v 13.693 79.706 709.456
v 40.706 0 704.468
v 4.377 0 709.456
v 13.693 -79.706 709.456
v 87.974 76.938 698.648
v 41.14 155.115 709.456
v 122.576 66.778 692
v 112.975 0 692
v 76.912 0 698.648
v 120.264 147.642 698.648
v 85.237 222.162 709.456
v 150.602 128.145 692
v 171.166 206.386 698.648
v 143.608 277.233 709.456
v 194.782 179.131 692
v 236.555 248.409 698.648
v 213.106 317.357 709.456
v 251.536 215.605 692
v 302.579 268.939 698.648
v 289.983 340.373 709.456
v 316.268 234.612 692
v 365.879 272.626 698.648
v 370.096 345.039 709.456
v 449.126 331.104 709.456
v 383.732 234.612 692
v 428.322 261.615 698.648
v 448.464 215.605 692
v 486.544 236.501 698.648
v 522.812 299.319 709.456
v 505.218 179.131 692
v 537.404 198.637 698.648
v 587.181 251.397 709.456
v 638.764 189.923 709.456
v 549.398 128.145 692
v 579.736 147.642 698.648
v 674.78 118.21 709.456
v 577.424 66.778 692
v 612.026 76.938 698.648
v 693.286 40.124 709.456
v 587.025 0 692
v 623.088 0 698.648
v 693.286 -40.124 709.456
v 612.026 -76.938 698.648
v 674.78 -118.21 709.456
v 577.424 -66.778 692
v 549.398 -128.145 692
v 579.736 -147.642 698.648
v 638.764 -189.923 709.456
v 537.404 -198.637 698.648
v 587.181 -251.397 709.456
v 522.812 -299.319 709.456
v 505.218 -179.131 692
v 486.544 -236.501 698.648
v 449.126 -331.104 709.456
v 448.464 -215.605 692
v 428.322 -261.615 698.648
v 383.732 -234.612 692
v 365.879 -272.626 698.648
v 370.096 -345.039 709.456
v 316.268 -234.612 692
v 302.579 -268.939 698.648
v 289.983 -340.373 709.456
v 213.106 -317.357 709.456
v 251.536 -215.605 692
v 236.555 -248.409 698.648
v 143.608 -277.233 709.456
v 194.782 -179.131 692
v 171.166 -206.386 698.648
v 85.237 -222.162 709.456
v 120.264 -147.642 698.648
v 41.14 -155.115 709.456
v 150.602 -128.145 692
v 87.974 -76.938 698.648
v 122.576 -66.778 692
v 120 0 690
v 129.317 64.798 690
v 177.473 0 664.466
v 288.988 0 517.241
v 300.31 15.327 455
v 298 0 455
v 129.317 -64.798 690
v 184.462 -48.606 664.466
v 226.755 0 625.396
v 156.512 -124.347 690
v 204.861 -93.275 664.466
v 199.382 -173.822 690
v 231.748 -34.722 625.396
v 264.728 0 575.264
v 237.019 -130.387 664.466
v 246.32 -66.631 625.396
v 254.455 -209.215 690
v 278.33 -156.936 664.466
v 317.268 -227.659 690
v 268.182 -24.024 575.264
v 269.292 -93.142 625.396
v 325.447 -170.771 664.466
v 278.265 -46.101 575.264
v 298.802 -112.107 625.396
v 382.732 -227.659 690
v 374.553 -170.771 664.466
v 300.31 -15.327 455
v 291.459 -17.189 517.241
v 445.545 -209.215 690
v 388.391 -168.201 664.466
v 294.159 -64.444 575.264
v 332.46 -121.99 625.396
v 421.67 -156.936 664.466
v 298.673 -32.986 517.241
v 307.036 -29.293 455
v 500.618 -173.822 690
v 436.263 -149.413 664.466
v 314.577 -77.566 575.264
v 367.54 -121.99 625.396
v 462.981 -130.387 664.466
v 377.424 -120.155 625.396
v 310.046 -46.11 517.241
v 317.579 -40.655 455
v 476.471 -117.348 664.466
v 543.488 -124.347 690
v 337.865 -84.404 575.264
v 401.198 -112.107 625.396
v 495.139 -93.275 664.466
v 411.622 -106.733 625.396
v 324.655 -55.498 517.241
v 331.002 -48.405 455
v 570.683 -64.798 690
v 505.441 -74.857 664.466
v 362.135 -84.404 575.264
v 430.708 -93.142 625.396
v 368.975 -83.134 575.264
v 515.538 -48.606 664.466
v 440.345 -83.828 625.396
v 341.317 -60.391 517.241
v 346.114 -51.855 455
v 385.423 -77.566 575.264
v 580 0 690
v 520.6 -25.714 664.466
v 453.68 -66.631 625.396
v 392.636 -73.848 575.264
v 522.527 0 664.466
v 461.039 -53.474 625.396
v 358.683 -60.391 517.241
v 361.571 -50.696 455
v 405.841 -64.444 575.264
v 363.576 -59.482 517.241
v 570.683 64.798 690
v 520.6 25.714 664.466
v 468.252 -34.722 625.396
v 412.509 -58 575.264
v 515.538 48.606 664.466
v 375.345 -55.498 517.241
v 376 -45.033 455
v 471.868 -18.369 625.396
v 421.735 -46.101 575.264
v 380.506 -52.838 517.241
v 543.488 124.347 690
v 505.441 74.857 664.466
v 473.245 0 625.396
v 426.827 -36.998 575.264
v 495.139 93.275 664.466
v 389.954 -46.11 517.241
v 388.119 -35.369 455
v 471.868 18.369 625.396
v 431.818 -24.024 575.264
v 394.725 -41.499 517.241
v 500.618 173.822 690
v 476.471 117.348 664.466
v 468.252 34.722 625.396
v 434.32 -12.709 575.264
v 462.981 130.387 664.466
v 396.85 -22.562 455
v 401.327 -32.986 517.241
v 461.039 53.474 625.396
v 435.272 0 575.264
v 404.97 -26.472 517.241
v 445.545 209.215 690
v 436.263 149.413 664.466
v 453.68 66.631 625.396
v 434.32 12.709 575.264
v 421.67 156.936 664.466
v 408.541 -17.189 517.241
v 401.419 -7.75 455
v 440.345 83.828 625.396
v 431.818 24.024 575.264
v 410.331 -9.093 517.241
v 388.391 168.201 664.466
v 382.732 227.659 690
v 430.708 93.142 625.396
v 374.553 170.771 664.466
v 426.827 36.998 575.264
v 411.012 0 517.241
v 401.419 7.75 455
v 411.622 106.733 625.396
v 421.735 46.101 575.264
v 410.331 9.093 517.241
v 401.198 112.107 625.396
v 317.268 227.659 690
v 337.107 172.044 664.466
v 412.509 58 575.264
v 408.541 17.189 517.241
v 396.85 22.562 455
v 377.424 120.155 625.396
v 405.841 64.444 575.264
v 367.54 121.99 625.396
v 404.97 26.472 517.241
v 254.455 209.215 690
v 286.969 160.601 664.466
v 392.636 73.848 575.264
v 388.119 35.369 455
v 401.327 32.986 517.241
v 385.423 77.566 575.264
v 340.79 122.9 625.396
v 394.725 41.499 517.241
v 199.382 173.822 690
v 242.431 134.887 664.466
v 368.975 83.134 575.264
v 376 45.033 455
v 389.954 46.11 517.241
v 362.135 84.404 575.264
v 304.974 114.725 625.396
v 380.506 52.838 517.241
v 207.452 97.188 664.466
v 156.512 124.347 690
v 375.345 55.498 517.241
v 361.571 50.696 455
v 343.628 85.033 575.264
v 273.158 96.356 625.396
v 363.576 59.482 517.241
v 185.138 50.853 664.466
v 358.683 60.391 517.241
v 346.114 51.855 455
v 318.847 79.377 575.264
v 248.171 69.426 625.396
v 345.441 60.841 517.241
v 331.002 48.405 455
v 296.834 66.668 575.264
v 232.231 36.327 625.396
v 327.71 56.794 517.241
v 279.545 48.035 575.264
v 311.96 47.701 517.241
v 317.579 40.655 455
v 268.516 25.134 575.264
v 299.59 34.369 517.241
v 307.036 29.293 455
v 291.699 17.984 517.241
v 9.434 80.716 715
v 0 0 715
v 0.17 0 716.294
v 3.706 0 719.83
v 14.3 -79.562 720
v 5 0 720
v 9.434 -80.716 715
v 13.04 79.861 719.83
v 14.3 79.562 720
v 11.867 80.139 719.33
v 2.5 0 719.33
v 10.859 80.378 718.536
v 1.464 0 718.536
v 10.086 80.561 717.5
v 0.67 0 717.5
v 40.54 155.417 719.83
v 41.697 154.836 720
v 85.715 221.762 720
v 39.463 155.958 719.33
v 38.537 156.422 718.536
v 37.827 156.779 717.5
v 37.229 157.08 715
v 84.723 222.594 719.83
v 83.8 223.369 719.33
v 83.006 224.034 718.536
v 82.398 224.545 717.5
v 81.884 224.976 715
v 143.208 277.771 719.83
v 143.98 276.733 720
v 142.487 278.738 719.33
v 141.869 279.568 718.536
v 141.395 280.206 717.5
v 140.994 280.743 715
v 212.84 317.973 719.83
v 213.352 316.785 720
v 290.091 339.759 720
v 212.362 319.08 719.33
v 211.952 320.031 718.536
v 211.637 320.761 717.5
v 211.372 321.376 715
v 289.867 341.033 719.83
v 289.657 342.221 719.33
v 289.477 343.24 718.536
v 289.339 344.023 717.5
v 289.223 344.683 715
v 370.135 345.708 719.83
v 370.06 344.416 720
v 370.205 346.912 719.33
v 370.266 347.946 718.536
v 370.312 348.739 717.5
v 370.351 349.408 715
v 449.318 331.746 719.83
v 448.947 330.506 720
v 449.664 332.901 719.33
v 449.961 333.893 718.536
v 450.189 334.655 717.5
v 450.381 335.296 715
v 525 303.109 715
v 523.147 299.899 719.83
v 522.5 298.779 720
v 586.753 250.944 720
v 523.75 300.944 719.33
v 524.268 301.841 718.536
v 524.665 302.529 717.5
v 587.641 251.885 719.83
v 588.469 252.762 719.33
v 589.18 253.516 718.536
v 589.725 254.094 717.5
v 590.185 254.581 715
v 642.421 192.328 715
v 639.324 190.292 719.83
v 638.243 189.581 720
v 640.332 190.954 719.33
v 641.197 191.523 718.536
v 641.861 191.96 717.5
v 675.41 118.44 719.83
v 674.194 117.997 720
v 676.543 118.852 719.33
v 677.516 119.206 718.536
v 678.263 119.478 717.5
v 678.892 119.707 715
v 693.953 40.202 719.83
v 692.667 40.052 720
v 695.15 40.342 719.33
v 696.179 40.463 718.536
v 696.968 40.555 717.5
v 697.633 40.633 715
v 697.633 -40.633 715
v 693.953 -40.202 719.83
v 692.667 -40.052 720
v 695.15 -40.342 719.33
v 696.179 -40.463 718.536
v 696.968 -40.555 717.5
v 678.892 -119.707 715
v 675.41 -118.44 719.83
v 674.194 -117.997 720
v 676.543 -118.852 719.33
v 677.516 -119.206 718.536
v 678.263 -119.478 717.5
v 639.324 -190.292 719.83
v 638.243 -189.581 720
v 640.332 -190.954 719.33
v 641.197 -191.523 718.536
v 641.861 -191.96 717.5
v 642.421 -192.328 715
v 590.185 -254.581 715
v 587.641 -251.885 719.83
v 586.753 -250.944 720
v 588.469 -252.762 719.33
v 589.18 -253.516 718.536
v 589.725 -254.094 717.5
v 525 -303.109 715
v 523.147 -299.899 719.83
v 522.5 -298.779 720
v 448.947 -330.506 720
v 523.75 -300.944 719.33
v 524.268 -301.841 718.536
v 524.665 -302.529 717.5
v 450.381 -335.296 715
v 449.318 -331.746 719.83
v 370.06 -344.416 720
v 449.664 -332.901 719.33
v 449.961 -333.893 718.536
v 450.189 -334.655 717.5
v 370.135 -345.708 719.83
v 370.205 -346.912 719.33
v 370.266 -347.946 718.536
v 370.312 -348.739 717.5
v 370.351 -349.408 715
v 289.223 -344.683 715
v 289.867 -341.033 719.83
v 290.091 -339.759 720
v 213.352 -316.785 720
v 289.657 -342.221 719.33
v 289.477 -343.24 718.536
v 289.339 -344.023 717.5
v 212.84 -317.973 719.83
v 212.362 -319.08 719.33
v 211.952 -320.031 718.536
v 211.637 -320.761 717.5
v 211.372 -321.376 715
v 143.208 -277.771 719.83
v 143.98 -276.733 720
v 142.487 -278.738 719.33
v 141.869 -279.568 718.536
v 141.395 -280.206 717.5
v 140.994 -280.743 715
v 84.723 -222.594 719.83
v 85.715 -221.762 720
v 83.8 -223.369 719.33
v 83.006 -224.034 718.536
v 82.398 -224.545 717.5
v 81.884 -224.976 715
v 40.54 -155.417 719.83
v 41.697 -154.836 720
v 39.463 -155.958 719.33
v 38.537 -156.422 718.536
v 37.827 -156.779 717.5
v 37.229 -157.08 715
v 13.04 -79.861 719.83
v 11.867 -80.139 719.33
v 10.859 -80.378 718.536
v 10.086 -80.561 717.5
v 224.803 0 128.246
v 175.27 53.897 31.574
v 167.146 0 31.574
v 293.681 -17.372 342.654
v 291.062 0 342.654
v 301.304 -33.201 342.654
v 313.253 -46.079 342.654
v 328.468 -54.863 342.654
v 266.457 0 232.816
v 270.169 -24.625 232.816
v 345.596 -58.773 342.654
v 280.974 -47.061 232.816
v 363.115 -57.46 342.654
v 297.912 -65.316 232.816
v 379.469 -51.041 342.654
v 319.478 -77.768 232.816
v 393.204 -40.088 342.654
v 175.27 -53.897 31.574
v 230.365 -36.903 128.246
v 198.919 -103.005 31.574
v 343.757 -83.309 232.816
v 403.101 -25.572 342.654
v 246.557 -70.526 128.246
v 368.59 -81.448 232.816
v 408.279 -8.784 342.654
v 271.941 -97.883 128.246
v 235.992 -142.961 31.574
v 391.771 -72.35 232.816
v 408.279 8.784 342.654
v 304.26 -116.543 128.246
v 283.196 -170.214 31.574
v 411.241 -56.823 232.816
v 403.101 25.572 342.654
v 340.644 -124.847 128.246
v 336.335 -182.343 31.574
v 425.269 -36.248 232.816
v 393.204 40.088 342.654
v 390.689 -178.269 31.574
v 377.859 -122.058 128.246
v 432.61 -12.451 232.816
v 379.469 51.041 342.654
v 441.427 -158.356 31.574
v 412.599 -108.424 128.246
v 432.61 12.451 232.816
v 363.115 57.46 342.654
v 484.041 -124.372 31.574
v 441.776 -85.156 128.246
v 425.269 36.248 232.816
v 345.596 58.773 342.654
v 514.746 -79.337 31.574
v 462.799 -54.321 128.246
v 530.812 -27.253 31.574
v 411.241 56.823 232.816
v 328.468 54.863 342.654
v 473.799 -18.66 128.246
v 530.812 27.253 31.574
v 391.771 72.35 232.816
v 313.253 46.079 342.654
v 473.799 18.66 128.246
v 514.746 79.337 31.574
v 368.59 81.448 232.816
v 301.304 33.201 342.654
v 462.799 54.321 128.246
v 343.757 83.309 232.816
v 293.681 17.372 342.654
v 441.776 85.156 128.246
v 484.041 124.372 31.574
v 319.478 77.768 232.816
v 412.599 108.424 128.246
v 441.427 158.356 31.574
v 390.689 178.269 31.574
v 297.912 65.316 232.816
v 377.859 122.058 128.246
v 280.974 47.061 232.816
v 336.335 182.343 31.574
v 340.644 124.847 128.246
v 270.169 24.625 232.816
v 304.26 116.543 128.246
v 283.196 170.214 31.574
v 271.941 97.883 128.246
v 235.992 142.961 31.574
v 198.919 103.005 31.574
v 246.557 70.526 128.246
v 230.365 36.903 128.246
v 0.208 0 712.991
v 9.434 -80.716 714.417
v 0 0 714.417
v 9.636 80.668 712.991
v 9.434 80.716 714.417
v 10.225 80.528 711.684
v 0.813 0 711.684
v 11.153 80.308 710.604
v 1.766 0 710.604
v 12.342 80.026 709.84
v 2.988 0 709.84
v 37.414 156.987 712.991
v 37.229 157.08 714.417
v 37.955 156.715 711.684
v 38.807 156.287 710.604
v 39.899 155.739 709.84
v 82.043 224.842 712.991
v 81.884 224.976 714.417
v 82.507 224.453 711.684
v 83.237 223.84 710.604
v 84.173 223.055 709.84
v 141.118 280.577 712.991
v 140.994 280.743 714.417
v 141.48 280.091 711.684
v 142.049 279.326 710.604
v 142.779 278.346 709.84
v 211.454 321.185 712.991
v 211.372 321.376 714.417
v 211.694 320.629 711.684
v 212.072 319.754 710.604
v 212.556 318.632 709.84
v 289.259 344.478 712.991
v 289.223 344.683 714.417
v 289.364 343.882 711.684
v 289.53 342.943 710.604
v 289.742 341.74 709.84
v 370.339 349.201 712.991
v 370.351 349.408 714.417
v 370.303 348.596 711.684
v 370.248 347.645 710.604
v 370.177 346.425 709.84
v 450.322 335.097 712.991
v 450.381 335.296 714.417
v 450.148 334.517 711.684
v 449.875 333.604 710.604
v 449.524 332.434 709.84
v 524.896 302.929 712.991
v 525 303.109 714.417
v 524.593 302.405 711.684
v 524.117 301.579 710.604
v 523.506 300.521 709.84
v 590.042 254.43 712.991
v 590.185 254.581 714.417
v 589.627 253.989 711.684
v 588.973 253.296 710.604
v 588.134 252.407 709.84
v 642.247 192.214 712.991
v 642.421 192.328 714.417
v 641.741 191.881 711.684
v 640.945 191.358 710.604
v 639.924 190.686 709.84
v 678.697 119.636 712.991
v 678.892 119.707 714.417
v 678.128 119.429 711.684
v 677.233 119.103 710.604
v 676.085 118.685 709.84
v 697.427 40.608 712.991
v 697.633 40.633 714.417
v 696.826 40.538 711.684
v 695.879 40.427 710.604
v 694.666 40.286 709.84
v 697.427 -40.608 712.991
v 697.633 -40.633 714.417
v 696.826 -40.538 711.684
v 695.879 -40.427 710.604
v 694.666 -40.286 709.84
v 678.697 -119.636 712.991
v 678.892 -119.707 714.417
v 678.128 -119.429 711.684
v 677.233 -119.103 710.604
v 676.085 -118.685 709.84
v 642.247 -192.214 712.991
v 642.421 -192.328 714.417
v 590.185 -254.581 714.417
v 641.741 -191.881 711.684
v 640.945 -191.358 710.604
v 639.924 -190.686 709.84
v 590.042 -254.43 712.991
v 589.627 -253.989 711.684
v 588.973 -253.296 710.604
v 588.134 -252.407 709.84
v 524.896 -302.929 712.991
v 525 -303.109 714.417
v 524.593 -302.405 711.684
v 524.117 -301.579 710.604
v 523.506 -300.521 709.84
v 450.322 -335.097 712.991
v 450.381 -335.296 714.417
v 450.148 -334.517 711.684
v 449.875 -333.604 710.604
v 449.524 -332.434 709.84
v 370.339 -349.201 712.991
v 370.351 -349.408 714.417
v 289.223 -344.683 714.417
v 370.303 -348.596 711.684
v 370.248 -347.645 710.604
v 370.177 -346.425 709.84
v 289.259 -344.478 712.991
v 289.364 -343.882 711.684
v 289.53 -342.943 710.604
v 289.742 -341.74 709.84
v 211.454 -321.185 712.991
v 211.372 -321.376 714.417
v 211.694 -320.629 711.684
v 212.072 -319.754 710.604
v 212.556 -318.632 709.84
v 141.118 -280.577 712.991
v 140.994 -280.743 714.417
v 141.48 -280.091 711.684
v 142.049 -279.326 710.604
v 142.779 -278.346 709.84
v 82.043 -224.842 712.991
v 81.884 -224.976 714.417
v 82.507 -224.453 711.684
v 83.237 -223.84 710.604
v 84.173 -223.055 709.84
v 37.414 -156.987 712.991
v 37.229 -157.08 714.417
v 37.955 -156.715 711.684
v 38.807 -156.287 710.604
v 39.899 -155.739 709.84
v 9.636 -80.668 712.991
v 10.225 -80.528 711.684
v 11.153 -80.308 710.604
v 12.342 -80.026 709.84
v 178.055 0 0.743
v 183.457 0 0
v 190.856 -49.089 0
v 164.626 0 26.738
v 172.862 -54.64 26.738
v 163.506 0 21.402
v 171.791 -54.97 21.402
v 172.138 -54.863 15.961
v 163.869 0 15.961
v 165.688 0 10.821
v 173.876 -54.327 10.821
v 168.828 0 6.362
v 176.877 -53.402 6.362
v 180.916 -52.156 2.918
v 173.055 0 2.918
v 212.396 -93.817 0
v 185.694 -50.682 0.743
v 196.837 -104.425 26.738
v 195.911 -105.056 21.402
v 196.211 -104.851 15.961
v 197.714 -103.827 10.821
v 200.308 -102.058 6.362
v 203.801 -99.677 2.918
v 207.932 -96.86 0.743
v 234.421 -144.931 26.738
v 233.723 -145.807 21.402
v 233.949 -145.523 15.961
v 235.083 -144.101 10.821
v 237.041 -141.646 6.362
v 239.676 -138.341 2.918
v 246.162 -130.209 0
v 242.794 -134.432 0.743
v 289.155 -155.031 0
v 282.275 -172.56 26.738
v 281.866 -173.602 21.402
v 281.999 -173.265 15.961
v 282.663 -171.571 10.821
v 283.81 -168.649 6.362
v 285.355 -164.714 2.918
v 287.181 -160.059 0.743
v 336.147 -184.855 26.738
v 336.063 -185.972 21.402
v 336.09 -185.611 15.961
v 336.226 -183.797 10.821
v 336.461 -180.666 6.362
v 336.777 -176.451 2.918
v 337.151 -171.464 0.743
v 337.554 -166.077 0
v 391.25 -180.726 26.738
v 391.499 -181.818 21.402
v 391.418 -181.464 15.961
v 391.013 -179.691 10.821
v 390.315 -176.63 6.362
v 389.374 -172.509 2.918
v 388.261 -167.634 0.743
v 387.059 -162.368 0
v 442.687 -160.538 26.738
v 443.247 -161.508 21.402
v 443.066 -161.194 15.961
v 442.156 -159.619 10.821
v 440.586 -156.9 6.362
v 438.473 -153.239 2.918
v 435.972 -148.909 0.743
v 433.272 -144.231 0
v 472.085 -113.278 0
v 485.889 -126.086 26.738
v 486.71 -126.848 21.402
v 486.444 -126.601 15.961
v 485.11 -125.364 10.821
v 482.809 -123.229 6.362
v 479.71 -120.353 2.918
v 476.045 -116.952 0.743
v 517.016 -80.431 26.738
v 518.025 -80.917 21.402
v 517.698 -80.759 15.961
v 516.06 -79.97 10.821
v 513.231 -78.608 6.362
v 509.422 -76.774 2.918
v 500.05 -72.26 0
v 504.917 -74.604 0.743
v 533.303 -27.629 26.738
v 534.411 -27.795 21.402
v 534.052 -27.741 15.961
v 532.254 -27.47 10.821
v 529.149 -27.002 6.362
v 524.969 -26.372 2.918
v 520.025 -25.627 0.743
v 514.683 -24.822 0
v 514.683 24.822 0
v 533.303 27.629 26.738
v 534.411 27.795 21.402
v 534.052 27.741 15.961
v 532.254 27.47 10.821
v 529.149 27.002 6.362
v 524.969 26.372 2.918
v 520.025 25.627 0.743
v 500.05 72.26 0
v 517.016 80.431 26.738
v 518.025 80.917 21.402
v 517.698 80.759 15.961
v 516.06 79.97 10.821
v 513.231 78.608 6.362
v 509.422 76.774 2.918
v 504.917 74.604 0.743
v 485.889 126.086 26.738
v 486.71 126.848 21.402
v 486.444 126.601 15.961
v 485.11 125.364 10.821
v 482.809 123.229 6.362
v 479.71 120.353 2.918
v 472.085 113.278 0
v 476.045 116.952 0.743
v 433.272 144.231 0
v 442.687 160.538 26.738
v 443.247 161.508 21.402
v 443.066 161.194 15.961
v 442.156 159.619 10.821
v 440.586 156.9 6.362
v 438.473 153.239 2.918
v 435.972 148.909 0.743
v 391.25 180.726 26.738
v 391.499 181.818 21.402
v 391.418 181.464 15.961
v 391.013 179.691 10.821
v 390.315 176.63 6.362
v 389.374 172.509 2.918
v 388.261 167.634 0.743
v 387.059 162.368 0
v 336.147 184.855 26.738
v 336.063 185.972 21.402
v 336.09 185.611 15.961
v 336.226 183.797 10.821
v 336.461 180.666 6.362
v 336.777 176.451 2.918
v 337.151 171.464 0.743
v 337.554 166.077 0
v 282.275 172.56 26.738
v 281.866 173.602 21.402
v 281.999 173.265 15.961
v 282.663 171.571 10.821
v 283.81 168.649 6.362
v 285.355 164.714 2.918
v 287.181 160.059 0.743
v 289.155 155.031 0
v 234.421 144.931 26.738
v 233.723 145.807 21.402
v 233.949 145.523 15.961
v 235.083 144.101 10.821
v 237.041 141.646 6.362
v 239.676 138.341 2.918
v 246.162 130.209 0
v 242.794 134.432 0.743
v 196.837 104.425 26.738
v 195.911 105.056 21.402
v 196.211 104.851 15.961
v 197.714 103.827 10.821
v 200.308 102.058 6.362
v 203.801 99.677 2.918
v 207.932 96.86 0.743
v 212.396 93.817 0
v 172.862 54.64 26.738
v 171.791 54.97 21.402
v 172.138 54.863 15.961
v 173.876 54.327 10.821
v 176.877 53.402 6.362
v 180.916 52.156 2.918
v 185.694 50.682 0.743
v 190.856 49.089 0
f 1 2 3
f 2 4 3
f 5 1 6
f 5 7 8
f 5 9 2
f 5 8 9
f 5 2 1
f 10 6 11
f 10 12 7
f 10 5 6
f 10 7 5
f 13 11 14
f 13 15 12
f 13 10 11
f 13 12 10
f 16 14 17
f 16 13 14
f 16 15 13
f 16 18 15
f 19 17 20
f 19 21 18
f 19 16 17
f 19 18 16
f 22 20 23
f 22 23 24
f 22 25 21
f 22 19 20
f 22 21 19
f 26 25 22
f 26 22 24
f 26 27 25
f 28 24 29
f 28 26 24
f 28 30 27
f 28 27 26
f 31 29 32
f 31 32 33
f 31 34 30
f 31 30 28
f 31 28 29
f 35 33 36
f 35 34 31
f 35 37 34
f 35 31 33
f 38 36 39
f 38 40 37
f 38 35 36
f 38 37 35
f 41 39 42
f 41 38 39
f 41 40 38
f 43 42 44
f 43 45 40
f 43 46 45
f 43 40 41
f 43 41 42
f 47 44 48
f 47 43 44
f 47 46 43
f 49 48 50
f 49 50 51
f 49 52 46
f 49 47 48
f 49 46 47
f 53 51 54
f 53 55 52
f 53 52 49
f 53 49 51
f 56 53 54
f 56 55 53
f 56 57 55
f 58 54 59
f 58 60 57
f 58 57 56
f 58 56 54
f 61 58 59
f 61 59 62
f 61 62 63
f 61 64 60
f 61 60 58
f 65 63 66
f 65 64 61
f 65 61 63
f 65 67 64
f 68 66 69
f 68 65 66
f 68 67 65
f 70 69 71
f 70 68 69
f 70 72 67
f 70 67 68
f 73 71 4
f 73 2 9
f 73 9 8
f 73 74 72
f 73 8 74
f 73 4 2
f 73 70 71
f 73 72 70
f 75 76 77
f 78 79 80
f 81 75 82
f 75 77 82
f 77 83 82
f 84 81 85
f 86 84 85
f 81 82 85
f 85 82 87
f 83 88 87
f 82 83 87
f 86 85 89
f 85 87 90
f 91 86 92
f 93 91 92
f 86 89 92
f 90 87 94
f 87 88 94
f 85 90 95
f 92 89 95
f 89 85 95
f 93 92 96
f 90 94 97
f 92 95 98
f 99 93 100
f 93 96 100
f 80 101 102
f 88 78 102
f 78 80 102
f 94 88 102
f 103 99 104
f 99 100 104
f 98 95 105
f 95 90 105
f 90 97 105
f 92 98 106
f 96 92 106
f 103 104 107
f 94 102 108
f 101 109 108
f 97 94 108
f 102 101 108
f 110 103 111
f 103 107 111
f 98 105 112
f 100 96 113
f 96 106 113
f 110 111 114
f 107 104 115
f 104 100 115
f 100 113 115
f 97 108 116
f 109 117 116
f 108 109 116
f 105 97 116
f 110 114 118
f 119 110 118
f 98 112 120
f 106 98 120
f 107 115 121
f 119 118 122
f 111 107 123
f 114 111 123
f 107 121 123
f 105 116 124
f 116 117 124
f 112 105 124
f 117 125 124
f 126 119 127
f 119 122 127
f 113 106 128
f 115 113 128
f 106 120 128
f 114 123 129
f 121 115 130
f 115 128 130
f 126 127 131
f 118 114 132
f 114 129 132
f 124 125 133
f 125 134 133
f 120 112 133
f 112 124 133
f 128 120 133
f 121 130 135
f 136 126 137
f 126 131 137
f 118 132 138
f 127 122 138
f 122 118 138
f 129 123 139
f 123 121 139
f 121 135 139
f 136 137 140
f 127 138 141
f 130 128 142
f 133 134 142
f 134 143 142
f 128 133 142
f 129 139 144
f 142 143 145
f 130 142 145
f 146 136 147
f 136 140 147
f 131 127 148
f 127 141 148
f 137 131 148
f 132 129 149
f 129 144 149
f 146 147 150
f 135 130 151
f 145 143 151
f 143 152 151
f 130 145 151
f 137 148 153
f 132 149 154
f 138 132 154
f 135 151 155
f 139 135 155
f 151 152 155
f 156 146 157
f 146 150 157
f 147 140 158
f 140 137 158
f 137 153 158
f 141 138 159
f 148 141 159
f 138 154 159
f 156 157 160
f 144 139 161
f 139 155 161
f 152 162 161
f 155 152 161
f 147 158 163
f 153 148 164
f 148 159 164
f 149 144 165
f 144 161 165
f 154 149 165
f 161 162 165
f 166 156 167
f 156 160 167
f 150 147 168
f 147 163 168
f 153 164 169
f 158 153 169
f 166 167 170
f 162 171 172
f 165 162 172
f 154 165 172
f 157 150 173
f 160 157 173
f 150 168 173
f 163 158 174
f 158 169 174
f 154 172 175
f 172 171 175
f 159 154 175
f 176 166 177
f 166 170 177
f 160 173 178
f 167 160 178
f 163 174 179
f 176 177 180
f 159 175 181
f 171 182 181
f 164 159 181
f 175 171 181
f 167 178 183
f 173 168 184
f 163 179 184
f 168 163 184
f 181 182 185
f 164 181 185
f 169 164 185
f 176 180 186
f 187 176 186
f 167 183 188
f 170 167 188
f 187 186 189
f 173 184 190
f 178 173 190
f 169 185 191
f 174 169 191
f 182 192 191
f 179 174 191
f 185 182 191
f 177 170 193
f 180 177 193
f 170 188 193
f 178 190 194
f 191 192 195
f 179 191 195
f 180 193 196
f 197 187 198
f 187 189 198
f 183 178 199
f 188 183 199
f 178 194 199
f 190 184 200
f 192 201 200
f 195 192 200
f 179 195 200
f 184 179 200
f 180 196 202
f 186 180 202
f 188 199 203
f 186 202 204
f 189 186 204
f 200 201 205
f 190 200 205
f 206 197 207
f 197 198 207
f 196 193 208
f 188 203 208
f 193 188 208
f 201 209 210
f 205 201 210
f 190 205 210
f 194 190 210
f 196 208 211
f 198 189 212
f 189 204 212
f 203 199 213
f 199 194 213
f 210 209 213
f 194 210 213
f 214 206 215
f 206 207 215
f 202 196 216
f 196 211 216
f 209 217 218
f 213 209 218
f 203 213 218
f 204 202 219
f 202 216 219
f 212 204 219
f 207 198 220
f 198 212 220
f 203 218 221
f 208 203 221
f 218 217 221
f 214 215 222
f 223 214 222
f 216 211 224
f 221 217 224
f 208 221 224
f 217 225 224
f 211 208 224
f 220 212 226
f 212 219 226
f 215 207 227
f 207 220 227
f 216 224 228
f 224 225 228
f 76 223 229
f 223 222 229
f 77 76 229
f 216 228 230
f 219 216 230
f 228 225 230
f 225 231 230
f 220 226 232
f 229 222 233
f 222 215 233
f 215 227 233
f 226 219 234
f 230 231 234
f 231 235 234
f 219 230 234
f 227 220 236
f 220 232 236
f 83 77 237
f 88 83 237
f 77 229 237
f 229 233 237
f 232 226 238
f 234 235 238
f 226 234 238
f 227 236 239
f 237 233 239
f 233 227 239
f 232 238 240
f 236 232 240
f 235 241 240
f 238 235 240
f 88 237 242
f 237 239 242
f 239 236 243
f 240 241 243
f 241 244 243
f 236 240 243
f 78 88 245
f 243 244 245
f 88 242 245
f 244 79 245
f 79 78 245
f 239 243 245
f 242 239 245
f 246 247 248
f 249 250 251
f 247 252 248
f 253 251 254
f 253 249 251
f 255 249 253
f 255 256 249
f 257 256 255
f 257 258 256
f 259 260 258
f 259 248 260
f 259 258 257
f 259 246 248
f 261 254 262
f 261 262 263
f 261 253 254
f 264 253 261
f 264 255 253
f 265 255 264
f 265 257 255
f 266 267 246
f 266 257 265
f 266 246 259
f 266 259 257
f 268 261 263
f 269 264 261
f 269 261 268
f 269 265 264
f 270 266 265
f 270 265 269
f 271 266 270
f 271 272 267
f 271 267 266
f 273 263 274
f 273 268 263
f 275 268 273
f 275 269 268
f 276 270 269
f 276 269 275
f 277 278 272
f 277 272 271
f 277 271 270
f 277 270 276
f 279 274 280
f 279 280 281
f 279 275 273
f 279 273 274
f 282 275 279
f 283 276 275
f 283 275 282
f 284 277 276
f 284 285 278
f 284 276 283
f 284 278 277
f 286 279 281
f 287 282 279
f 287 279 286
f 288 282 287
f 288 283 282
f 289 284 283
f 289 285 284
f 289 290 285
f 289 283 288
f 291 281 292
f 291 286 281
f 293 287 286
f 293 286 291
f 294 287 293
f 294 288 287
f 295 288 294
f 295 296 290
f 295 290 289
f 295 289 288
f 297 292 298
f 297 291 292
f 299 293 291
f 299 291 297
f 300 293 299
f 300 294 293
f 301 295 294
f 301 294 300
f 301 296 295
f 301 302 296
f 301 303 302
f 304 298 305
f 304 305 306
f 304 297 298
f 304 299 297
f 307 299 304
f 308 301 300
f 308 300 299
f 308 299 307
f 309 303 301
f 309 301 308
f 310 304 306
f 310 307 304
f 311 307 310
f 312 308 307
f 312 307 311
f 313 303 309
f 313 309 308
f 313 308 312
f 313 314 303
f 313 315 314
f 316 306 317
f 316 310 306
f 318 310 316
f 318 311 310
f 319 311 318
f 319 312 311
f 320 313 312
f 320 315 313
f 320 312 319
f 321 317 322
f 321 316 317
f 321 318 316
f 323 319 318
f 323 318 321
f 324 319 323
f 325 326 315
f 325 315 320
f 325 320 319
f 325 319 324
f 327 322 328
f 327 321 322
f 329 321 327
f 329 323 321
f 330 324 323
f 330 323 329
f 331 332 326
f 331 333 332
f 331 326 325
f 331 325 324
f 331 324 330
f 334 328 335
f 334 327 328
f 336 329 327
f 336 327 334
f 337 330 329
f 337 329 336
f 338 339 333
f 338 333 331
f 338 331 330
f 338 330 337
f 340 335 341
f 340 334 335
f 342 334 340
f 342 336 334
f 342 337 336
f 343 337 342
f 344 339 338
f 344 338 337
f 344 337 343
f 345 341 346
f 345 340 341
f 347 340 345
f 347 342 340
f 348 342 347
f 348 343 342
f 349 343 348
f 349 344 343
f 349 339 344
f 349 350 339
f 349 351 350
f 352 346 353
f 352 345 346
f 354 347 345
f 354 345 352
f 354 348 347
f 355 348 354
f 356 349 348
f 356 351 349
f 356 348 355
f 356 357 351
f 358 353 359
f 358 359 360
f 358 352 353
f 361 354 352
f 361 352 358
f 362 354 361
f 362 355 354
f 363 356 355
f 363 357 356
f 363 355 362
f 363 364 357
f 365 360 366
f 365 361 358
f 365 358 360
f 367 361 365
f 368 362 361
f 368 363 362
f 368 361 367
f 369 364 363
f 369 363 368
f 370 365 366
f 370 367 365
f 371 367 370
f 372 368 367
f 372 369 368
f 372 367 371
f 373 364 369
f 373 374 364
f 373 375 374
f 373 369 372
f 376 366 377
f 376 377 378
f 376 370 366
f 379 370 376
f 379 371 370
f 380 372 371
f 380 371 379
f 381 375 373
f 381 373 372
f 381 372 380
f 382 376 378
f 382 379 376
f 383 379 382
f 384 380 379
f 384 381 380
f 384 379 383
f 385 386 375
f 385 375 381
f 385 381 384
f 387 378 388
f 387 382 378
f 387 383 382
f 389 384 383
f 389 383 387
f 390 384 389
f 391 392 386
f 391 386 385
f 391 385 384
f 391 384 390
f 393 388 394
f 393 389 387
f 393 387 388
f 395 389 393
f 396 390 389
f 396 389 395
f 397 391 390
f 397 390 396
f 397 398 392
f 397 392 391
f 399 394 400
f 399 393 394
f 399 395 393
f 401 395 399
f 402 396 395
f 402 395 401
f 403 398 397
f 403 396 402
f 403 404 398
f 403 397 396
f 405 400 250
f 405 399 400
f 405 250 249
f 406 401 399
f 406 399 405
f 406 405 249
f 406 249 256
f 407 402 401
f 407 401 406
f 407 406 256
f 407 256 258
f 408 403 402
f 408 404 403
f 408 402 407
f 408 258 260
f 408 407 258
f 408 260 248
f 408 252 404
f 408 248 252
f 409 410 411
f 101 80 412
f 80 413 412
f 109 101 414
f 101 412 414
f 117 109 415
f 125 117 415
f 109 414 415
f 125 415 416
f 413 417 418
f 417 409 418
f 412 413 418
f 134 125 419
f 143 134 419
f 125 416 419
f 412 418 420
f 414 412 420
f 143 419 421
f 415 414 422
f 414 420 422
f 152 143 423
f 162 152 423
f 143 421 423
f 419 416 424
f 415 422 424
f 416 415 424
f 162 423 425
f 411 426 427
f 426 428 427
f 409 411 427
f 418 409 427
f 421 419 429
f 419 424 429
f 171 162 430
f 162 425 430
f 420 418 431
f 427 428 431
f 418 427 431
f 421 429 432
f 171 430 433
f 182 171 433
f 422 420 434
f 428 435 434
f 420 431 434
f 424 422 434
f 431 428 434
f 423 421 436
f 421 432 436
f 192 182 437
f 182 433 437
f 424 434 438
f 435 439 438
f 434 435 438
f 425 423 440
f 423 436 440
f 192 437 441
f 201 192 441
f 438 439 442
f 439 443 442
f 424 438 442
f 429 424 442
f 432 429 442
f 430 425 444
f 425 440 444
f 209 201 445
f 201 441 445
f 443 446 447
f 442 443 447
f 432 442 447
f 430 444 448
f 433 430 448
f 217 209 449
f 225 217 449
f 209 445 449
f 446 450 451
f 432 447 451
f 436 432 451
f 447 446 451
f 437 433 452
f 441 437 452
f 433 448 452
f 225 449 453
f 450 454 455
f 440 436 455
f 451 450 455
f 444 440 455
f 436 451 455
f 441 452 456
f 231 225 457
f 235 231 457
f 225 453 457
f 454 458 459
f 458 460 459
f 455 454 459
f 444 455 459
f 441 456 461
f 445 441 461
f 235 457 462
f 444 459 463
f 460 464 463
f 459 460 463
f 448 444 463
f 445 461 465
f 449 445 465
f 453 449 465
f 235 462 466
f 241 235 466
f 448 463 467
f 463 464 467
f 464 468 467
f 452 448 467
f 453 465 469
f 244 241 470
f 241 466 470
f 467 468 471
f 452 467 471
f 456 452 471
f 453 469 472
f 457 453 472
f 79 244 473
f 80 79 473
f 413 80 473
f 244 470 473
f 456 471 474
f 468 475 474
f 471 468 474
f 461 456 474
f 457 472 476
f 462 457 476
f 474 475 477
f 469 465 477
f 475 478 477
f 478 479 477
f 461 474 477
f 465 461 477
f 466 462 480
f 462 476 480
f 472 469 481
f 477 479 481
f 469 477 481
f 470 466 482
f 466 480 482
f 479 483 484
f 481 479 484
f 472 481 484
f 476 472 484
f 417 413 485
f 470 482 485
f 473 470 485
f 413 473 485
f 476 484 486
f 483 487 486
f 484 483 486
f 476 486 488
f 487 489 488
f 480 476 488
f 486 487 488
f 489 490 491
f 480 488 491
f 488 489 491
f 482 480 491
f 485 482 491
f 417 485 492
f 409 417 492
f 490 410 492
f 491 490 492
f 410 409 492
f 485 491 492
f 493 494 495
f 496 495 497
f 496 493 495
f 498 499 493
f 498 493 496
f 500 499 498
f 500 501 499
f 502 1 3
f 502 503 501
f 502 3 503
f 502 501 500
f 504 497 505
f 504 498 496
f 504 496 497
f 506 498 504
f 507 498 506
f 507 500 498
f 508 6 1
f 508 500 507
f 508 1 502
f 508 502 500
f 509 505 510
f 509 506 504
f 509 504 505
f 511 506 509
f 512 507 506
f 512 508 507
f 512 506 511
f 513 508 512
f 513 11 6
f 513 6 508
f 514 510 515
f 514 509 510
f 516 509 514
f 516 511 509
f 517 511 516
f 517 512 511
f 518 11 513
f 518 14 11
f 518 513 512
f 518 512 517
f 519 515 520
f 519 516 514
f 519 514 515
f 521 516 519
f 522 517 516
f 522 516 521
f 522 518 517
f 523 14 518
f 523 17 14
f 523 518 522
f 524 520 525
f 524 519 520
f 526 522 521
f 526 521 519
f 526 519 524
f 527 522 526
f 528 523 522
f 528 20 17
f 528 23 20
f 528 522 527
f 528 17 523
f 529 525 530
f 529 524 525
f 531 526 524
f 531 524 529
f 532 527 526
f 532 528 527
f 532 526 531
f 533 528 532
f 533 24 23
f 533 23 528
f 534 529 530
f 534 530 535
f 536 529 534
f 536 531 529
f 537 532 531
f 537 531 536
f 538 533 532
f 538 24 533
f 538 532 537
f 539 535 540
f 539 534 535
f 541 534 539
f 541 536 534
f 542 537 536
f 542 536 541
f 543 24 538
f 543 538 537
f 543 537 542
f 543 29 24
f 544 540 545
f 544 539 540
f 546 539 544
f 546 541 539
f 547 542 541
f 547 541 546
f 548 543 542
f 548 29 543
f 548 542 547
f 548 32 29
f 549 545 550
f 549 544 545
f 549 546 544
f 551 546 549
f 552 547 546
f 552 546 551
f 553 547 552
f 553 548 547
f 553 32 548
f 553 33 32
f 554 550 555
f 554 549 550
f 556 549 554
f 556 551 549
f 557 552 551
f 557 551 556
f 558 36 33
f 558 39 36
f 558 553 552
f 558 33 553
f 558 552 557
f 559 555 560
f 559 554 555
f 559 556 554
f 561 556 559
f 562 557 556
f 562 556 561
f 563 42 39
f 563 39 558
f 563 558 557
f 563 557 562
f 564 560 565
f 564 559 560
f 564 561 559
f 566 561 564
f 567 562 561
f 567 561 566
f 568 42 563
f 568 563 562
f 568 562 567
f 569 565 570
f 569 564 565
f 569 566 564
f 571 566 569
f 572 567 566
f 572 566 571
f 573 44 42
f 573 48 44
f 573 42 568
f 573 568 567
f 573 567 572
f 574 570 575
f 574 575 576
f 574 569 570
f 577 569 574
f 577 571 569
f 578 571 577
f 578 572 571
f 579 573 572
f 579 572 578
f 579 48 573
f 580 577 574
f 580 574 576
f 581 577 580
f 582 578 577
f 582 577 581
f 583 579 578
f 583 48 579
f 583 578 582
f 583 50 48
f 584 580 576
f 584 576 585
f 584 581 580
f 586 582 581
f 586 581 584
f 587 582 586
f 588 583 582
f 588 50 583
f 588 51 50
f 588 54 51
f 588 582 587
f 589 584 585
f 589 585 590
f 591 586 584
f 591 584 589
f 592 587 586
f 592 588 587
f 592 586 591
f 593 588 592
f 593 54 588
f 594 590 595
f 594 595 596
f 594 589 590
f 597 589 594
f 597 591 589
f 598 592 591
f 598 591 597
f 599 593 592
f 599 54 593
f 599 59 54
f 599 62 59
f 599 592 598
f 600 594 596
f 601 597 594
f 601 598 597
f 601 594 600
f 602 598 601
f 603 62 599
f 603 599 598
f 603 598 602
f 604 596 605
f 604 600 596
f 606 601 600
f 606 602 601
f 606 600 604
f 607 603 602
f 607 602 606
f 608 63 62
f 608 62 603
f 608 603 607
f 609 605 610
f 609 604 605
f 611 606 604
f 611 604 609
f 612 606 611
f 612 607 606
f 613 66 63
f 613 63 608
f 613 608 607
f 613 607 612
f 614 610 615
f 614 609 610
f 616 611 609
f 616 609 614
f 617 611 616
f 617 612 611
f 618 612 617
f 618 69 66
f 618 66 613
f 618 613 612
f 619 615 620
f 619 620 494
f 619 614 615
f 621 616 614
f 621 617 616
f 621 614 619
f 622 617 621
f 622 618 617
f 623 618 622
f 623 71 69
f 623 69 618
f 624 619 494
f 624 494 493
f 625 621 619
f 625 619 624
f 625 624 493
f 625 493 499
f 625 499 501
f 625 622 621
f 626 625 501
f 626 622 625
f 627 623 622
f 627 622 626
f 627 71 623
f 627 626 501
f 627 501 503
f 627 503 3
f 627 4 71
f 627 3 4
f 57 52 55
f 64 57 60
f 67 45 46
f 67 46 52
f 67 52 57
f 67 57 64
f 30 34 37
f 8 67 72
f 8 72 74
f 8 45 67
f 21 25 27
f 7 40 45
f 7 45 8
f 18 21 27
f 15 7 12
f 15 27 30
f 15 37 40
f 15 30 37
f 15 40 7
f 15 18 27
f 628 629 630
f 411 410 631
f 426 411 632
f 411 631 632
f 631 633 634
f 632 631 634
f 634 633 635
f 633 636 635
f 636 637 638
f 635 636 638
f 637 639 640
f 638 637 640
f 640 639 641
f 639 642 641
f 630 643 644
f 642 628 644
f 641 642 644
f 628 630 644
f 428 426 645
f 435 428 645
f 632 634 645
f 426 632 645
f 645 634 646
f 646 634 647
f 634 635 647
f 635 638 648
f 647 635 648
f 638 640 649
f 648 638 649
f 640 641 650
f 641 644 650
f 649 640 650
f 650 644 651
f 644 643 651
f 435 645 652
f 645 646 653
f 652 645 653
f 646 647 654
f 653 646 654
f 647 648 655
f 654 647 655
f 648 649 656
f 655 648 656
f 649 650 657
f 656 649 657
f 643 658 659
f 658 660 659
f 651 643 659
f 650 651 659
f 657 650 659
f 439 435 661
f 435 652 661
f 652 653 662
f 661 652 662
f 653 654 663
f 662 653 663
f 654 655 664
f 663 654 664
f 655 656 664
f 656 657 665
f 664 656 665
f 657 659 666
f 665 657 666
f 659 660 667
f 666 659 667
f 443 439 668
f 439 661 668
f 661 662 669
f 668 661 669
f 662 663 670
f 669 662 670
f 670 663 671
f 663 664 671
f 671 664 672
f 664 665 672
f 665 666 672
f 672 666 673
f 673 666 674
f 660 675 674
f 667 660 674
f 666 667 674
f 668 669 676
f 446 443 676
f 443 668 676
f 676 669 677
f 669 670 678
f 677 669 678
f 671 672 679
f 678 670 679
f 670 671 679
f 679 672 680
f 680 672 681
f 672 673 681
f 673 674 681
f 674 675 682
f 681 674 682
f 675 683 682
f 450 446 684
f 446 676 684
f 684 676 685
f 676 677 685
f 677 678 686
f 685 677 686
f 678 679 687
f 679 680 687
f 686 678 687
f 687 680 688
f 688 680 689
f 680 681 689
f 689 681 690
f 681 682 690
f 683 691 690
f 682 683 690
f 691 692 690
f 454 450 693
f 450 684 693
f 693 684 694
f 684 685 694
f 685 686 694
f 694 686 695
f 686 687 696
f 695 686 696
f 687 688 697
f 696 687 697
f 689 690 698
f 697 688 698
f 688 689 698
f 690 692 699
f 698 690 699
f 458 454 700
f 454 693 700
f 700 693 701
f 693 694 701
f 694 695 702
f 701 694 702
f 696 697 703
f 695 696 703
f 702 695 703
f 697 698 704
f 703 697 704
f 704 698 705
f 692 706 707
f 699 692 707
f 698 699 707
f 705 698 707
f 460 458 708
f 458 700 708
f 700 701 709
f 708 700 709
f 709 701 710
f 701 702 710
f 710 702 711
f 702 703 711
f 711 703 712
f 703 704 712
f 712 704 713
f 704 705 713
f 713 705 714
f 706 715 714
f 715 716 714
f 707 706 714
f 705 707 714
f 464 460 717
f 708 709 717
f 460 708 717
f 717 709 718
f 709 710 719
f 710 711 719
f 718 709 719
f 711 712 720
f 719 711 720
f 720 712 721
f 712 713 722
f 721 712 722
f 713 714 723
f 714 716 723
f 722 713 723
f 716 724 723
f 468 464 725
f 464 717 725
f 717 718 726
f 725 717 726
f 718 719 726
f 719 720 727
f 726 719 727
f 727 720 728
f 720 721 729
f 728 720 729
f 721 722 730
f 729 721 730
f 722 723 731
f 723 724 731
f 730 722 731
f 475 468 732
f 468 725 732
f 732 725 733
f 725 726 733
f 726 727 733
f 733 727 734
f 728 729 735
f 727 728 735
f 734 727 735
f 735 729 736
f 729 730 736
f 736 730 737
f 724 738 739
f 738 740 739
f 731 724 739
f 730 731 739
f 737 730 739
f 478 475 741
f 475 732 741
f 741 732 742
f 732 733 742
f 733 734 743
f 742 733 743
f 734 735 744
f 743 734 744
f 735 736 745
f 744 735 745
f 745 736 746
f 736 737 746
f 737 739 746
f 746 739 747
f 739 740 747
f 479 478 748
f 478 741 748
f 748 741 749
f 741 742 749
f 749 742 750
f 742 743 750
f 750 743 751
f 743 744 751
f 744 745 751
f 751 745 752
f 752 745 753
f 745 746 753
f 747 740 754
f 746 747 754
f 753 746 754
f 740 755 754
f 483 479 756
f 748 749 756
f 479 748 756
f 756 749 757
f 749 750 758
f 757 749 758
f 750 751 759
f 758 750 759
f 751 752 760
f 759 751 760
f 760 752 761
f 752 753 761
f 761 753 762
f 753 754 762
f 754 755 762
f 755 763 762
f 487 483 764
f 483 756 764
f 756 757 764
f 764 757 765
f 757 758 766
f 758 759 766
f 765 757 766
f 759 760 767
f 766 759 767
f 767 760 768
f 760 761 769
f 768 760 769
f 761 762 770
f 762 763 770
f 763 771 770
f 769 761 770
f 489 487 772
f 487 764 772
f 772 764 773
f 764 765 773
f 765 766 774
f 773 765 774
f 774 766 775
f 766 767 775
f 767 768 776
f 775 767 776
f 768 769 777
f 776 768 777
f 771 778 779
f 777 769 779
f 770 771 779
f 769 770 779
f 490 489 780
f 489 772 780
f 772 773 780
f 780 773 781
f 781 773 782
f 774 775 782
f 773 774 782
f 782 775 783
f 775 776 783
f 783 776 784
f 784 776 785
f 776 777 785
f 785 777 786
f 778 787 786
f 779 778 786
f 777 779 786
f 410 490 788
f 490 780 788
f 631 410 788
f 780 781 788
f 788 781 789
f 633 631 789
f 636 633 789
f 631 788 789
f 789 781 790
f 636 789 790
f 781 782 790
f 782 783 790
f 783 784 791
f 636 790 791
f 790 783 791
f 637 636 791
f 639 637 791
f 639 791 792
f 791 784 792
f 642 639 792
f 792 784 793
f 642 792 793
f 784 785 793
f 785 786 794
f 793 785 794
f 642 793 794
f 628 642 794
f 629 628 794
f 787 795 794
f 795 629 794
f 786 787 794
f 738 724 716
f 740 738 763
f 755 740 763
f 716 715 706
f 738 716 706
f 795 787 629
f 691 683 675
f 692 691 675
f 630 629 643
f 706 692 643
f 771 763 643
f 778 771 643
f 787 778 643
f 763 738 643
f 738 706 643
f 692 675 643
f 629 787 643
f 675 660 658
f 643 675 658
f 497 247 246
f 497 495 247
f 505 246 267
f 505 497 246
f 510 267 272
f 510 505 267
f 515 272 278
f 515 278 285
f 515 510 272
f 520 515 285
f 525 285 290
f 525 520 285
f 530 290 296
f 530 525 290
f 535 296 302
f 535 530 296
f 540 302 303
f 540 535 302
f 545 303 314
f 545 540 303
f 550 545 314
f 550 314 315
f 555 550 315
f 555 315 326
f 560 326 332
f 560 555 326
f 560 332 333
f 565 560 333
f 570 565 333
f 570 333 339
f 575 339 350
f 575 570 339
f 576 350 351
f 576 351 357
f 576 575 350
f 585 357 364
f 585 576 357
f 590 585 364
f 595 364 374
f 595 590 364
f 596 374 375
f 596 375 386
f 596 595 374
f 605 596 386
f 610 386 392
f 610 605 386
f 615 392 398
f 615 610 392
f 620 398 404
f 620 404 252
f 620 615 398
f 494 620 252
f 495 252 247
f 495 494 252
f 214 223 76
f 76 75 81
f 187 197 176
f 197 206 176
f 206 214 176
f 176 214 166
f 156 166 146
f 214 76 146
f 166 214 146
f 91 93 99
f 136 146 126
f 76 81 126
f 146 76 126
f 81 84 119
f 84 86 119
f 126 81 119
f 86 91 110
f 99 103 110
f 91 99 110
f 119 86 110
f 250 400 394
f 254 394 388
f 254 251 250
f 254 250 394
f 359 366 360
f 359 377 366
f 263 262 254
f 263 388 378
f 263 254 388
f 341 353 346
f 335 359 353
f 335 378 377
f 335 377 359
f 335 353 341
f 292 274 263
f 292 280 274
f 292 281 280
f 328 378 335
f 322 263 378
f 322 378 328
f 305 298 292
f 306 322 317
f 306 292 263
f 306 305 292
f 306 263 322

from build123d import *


with BuildPart() as f3:
    # F1 (on Front) → F3 (revolve)
    with BuildSketch(Plane.XZ):
        with BuildLine():
            Line((350, 0), (350, 690))
            Line((350, 690), (120, 690))
            ThreePointArc((120, 690), (247.32447, 601.528747), (298, 455))
            ThreePointArc((298, 455), (266.457297, 232.815507), (167.146042, 31.573947))
            ThreePointArc((167.146042, 31.573947), (165.68783, 10.820646), (183.456889, 0))
            Line((183.456889, 0), (350, 0))
        make_face()
    revolve(axis=Axis((350, 0, 345), (0, 0, 1)))


with BuildPart() as f5:
    # F4 (on Front) → F5 (revolve)
    with BuildSketch(Plane.XZ):
        with BuildLine():
            Line((350, 692), (350, 720))
            Line((350, 720), (5, 720))
            ThreePointArc((5, 720), (1.464466, 718.535534), (0, 715))
            Line((0, 715), (0, 714.417179))
            ThreePointArc((0, 714.417179), (1.250546, 711.109371), (4.376637, 709.456189))
            ThreePointArc((4.376637, 709.456189), (58.825956, 701.661576), (112.975178, 692))
            Line((112.975178, 692), (350, 692))
        make_face()
    revolve(axis=Axis((350, 0, 706), (0, 0, -1)))


solid = Compound([f3.part, f5.part])
